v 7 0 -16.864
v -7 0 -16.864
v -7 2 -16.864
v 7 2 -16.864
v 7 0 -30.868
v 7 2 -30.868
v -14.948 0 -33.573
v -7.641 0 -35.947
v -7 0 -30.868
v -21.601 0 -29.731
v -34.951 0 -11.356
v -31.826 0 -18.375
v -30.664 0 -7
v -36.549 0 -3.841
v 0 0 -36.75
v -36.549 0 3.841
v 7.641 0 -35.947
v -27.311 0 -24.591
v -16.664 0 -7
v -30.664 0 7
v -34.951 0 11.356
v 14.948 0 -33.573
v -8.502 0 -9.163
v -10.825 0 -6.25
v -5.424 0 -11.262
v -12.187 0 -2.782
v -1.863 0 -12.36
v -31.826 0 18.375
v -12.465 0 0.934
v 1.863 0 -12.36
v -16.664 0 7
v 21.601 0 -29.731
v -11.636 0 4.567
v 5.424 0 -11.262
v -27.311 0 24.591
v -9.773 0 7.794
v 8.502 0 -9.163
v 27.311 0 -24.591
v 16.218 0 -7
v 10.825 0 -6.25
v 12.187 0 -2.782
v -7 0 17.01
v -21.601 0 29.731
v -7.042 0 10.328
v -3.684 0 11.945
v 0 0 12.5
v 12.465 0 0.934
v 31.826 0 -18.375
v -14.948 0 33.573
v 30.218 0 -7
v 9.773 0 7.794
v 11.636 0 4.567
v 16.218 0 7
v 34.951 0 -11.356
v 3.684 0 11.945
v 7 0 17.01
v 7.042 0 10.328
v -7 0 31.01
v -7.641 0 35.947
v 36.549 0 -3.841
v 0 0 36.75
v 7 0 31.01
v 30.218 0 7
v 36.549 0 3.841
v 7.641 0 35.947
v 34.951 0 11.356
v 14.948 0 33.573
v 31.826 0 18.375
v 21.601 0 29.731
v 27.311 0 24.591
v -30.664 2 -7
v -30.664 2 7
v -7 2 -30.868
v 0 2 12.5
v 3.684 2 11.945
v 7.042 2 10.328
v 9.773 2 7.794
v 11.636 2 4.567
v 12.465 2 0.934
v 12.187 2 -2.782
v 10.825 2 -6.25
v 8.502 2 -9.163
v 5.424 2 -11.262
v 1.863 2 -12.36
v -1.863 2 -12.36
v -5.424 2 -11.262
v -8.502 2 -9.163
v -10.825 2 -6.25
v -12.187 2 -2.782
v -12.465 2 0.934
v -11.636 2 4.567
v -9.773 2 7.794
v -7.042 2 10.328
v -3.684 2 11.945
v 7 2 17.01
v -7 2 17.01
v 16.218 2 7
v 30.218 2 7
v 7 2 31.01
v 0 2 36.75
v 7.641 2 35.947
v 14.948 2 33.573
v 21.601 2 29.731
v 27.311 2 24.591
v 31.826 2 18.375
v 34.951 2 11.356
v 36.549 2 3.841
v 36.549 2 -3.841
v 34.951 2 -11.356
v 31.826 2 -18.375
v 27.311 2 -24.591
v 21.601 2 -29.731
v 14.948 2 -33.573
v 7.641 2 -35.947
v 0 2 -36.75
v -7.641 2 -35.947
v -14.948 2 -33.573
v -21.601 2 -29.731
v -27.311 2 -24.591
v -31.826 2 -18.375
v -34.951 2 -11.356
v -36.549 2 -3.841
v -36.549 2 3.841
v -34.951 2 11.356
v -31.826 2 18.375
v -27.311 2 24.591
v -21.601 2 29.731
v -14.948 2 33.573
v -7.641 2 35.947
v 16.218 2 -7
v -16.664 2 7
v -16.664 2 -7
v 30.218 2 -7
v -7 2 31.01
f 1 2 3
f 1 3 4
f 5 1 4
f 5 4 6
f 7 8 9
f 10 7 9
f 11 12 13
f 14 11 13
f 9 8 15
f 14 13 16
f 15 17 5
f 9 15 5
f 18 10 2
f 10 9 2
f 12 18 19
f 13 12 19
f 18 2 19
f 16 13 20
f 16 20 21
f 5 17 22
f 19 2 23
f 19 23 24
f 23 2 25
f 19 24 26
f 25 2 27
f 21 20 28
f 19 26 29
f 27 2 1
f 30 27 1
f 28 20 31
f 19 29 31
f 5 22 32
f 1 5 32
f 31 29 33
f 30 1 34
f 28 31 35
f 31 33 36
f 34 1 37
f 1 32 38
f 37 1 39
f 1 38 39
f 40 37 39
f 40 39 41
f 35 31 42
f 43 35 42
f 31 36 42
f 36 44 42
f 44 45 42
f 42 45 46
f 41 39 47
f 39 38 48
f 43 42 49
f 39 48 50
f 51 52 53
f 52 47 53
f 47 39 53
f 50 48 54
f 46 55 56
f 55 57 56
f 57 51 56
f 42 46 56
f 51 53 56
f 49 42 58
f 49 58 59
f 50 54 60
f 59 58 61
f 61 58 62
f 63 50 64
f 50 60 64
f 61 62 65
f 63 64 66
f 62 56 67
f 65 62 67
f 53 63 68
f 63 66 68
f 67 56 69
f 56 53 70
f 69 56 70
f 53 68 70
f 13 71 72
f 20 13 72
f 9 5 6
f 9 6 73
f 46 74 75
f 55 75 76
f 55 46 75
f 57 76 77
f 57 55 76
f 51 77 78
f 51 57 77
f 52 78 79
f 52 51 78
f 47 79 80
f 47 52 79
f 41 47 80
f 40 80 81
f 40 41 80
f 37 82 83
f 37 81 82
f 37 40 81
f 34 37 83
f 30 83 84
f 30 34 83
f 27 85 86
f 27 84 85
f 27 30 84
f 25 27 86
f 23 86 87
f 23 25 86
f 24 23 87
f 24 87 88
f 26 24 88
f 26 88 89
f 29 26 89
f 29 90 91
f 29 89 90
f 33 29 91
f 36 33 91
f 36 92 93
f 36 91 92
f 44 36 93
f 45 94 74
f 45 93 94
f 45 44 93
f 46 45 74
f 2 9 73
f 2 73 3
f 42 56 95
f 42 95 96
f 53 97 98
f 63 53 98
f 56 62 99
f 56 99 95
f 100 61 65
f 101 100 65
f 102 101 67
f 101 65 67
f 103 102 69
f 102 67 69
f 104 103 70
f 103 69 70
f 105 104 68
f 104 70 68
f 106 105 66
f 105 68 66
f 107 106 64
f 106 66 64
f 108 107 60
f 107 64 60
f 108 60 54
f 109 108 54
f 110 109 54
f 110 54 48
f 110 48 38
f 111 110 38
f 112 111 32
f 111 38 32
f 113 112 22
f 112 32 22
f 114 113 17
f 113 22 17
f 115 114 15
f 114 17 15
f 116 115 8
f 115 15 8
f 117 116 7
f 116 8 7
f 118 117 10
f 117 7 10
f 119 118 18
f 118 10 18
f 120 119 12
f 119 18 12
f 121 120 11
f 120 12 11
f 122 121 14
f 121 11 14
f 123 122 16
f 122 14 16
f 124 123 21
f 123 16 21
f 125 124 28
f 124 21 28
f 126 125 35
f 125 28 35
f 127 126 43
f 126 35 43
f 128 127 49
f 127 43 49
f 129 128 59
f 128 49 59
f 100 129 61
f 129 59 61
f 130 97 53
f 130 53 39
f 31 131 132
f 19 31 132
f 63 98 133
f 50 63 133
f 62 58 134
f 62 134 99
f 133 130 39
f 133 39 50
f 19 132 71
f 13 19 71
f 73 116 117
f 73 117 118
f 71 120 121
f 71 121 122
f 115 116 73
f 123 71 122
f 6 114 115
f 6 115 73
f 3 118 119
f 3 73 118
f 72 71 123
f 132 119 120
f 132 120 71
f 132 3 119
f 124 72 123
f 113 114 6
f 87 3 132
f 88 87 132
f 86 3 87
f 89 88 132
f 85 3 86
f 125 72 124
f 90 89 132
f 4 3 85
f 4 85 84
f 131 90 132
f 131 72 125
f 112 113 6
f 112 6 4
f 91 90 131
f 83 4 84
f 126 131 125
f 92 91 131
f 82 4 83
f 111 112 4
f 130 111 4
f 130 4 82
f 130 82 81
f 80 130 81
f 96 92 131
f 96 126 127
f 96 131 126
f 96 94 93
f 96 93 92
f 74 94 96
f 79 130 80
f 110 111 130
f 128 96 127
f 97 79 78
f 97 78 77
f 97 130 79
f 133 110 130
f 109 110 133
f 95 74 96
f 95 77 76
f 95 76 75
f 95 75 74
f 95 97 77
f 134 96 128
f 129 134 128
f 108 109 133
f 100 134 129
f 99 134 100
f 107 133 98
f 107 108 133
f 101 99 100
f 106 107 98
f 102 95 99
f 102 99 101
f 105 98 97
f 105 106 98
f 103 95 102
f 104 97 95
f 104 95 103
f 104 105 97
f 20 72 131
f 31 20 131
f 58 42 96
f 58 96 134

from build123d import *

# Parameters (mm, degrees)
SKETCH3_R           = 36.75
BOSS_EXTRUDE1_DEPTH = 2
SKETCH4_R           = 12.5
CUT_EXTRUDE1_DEPTH  = 53.010816183
CUT_EXTRUDE2_DEPTH  = 53.010816183
SKETCH6_W           = 14
SKETCH6_H           = 14
CUT_EXTRUDE3_DEPTH  = 53.010816183
CUT_EXTRUDE4_DEPTH  = 53.010816183


with BuildPart() as part:
    # Sketch3 → Boss-Extrude1 (new body)
    with BuildSketch(Plane(origin=(0, 0, 0), x_dir=(1, 0, 0), z_dir=(0, 1, 0))):
        with Locations(Location((0, 0, 0), (0, 0, 270))):
            Circle(SKETCH3_R)
    extrude(amount=BOSS_EXTRUDE1_DEPTH)

    # Sketch4 → Cut-Extrude1 (cut, through all)
    with BuildSketch(Plane(origin=(0, 0, 0), x_dir=(1, 0, 0), z_dir=(0, 1, 0))):
        with Locations(Location((0, 0, 0), (0, 0, 270))):
            Circle(SKETCH4_R)
    extrude(amount=CUT_EXTRUDE1_DEPTH, mode=Mode.SUBTRACT)

    # Sketch5 → Cut-Extrude2 (cut, through all)
    with BuildSketch(Plane(origin=(0, 2, 0), x_dir=(1, 0, 0), z_dir=(0, 1, 0))):
        Polygon((-30.663619776, 7), (-30.663619776, 0), (-30.663619776, -7), (-16.663619776, -7), (-16.663619776, 7), align=None)
    extrude(amount=-CUT_EXTRUDE2_DEPTH, mode=Mode.SUBTRACT)

    # Sketch6 → Cut-Extrude3 (cut, through all)
    with BuildSketch(Plane(origin=(0, 2, 0), x_dir=(1, 0, 0), z_dir=(0, 1, 0))):
        with Locations((23.218077959, 0)):
            Rectangle(SKETCH6_W, SKETCH6_H)
    extrude(amount=-CUT_EXTRUDE3_DEPTH, mode=Mode.SUBTRACT)

    # Sketch8 → Cut-Extrude4 (cut, through all)
    with BuildSketch(Plane(origin=(0, 0, 0), x_dir=(1, 0, 0), z_dir=(0, 1, 0))):
        Polygon((0, 30.868072457), (-7, 30.868072457), (-7, 16.864385373), (6.999997959, 16.864385373), (6.999997959, 30.868072457), align=None)
        Polygon((0, -31.010274177), (7, -31.010274177), (7, -17.010274177), (-7, -17.010274177), (-7, -31.010274177), align=None)
    extrude(amount=CUT_EXTRUDE4_DEPTH, mode=Mode.SUBTRACT)


solid = part.part
